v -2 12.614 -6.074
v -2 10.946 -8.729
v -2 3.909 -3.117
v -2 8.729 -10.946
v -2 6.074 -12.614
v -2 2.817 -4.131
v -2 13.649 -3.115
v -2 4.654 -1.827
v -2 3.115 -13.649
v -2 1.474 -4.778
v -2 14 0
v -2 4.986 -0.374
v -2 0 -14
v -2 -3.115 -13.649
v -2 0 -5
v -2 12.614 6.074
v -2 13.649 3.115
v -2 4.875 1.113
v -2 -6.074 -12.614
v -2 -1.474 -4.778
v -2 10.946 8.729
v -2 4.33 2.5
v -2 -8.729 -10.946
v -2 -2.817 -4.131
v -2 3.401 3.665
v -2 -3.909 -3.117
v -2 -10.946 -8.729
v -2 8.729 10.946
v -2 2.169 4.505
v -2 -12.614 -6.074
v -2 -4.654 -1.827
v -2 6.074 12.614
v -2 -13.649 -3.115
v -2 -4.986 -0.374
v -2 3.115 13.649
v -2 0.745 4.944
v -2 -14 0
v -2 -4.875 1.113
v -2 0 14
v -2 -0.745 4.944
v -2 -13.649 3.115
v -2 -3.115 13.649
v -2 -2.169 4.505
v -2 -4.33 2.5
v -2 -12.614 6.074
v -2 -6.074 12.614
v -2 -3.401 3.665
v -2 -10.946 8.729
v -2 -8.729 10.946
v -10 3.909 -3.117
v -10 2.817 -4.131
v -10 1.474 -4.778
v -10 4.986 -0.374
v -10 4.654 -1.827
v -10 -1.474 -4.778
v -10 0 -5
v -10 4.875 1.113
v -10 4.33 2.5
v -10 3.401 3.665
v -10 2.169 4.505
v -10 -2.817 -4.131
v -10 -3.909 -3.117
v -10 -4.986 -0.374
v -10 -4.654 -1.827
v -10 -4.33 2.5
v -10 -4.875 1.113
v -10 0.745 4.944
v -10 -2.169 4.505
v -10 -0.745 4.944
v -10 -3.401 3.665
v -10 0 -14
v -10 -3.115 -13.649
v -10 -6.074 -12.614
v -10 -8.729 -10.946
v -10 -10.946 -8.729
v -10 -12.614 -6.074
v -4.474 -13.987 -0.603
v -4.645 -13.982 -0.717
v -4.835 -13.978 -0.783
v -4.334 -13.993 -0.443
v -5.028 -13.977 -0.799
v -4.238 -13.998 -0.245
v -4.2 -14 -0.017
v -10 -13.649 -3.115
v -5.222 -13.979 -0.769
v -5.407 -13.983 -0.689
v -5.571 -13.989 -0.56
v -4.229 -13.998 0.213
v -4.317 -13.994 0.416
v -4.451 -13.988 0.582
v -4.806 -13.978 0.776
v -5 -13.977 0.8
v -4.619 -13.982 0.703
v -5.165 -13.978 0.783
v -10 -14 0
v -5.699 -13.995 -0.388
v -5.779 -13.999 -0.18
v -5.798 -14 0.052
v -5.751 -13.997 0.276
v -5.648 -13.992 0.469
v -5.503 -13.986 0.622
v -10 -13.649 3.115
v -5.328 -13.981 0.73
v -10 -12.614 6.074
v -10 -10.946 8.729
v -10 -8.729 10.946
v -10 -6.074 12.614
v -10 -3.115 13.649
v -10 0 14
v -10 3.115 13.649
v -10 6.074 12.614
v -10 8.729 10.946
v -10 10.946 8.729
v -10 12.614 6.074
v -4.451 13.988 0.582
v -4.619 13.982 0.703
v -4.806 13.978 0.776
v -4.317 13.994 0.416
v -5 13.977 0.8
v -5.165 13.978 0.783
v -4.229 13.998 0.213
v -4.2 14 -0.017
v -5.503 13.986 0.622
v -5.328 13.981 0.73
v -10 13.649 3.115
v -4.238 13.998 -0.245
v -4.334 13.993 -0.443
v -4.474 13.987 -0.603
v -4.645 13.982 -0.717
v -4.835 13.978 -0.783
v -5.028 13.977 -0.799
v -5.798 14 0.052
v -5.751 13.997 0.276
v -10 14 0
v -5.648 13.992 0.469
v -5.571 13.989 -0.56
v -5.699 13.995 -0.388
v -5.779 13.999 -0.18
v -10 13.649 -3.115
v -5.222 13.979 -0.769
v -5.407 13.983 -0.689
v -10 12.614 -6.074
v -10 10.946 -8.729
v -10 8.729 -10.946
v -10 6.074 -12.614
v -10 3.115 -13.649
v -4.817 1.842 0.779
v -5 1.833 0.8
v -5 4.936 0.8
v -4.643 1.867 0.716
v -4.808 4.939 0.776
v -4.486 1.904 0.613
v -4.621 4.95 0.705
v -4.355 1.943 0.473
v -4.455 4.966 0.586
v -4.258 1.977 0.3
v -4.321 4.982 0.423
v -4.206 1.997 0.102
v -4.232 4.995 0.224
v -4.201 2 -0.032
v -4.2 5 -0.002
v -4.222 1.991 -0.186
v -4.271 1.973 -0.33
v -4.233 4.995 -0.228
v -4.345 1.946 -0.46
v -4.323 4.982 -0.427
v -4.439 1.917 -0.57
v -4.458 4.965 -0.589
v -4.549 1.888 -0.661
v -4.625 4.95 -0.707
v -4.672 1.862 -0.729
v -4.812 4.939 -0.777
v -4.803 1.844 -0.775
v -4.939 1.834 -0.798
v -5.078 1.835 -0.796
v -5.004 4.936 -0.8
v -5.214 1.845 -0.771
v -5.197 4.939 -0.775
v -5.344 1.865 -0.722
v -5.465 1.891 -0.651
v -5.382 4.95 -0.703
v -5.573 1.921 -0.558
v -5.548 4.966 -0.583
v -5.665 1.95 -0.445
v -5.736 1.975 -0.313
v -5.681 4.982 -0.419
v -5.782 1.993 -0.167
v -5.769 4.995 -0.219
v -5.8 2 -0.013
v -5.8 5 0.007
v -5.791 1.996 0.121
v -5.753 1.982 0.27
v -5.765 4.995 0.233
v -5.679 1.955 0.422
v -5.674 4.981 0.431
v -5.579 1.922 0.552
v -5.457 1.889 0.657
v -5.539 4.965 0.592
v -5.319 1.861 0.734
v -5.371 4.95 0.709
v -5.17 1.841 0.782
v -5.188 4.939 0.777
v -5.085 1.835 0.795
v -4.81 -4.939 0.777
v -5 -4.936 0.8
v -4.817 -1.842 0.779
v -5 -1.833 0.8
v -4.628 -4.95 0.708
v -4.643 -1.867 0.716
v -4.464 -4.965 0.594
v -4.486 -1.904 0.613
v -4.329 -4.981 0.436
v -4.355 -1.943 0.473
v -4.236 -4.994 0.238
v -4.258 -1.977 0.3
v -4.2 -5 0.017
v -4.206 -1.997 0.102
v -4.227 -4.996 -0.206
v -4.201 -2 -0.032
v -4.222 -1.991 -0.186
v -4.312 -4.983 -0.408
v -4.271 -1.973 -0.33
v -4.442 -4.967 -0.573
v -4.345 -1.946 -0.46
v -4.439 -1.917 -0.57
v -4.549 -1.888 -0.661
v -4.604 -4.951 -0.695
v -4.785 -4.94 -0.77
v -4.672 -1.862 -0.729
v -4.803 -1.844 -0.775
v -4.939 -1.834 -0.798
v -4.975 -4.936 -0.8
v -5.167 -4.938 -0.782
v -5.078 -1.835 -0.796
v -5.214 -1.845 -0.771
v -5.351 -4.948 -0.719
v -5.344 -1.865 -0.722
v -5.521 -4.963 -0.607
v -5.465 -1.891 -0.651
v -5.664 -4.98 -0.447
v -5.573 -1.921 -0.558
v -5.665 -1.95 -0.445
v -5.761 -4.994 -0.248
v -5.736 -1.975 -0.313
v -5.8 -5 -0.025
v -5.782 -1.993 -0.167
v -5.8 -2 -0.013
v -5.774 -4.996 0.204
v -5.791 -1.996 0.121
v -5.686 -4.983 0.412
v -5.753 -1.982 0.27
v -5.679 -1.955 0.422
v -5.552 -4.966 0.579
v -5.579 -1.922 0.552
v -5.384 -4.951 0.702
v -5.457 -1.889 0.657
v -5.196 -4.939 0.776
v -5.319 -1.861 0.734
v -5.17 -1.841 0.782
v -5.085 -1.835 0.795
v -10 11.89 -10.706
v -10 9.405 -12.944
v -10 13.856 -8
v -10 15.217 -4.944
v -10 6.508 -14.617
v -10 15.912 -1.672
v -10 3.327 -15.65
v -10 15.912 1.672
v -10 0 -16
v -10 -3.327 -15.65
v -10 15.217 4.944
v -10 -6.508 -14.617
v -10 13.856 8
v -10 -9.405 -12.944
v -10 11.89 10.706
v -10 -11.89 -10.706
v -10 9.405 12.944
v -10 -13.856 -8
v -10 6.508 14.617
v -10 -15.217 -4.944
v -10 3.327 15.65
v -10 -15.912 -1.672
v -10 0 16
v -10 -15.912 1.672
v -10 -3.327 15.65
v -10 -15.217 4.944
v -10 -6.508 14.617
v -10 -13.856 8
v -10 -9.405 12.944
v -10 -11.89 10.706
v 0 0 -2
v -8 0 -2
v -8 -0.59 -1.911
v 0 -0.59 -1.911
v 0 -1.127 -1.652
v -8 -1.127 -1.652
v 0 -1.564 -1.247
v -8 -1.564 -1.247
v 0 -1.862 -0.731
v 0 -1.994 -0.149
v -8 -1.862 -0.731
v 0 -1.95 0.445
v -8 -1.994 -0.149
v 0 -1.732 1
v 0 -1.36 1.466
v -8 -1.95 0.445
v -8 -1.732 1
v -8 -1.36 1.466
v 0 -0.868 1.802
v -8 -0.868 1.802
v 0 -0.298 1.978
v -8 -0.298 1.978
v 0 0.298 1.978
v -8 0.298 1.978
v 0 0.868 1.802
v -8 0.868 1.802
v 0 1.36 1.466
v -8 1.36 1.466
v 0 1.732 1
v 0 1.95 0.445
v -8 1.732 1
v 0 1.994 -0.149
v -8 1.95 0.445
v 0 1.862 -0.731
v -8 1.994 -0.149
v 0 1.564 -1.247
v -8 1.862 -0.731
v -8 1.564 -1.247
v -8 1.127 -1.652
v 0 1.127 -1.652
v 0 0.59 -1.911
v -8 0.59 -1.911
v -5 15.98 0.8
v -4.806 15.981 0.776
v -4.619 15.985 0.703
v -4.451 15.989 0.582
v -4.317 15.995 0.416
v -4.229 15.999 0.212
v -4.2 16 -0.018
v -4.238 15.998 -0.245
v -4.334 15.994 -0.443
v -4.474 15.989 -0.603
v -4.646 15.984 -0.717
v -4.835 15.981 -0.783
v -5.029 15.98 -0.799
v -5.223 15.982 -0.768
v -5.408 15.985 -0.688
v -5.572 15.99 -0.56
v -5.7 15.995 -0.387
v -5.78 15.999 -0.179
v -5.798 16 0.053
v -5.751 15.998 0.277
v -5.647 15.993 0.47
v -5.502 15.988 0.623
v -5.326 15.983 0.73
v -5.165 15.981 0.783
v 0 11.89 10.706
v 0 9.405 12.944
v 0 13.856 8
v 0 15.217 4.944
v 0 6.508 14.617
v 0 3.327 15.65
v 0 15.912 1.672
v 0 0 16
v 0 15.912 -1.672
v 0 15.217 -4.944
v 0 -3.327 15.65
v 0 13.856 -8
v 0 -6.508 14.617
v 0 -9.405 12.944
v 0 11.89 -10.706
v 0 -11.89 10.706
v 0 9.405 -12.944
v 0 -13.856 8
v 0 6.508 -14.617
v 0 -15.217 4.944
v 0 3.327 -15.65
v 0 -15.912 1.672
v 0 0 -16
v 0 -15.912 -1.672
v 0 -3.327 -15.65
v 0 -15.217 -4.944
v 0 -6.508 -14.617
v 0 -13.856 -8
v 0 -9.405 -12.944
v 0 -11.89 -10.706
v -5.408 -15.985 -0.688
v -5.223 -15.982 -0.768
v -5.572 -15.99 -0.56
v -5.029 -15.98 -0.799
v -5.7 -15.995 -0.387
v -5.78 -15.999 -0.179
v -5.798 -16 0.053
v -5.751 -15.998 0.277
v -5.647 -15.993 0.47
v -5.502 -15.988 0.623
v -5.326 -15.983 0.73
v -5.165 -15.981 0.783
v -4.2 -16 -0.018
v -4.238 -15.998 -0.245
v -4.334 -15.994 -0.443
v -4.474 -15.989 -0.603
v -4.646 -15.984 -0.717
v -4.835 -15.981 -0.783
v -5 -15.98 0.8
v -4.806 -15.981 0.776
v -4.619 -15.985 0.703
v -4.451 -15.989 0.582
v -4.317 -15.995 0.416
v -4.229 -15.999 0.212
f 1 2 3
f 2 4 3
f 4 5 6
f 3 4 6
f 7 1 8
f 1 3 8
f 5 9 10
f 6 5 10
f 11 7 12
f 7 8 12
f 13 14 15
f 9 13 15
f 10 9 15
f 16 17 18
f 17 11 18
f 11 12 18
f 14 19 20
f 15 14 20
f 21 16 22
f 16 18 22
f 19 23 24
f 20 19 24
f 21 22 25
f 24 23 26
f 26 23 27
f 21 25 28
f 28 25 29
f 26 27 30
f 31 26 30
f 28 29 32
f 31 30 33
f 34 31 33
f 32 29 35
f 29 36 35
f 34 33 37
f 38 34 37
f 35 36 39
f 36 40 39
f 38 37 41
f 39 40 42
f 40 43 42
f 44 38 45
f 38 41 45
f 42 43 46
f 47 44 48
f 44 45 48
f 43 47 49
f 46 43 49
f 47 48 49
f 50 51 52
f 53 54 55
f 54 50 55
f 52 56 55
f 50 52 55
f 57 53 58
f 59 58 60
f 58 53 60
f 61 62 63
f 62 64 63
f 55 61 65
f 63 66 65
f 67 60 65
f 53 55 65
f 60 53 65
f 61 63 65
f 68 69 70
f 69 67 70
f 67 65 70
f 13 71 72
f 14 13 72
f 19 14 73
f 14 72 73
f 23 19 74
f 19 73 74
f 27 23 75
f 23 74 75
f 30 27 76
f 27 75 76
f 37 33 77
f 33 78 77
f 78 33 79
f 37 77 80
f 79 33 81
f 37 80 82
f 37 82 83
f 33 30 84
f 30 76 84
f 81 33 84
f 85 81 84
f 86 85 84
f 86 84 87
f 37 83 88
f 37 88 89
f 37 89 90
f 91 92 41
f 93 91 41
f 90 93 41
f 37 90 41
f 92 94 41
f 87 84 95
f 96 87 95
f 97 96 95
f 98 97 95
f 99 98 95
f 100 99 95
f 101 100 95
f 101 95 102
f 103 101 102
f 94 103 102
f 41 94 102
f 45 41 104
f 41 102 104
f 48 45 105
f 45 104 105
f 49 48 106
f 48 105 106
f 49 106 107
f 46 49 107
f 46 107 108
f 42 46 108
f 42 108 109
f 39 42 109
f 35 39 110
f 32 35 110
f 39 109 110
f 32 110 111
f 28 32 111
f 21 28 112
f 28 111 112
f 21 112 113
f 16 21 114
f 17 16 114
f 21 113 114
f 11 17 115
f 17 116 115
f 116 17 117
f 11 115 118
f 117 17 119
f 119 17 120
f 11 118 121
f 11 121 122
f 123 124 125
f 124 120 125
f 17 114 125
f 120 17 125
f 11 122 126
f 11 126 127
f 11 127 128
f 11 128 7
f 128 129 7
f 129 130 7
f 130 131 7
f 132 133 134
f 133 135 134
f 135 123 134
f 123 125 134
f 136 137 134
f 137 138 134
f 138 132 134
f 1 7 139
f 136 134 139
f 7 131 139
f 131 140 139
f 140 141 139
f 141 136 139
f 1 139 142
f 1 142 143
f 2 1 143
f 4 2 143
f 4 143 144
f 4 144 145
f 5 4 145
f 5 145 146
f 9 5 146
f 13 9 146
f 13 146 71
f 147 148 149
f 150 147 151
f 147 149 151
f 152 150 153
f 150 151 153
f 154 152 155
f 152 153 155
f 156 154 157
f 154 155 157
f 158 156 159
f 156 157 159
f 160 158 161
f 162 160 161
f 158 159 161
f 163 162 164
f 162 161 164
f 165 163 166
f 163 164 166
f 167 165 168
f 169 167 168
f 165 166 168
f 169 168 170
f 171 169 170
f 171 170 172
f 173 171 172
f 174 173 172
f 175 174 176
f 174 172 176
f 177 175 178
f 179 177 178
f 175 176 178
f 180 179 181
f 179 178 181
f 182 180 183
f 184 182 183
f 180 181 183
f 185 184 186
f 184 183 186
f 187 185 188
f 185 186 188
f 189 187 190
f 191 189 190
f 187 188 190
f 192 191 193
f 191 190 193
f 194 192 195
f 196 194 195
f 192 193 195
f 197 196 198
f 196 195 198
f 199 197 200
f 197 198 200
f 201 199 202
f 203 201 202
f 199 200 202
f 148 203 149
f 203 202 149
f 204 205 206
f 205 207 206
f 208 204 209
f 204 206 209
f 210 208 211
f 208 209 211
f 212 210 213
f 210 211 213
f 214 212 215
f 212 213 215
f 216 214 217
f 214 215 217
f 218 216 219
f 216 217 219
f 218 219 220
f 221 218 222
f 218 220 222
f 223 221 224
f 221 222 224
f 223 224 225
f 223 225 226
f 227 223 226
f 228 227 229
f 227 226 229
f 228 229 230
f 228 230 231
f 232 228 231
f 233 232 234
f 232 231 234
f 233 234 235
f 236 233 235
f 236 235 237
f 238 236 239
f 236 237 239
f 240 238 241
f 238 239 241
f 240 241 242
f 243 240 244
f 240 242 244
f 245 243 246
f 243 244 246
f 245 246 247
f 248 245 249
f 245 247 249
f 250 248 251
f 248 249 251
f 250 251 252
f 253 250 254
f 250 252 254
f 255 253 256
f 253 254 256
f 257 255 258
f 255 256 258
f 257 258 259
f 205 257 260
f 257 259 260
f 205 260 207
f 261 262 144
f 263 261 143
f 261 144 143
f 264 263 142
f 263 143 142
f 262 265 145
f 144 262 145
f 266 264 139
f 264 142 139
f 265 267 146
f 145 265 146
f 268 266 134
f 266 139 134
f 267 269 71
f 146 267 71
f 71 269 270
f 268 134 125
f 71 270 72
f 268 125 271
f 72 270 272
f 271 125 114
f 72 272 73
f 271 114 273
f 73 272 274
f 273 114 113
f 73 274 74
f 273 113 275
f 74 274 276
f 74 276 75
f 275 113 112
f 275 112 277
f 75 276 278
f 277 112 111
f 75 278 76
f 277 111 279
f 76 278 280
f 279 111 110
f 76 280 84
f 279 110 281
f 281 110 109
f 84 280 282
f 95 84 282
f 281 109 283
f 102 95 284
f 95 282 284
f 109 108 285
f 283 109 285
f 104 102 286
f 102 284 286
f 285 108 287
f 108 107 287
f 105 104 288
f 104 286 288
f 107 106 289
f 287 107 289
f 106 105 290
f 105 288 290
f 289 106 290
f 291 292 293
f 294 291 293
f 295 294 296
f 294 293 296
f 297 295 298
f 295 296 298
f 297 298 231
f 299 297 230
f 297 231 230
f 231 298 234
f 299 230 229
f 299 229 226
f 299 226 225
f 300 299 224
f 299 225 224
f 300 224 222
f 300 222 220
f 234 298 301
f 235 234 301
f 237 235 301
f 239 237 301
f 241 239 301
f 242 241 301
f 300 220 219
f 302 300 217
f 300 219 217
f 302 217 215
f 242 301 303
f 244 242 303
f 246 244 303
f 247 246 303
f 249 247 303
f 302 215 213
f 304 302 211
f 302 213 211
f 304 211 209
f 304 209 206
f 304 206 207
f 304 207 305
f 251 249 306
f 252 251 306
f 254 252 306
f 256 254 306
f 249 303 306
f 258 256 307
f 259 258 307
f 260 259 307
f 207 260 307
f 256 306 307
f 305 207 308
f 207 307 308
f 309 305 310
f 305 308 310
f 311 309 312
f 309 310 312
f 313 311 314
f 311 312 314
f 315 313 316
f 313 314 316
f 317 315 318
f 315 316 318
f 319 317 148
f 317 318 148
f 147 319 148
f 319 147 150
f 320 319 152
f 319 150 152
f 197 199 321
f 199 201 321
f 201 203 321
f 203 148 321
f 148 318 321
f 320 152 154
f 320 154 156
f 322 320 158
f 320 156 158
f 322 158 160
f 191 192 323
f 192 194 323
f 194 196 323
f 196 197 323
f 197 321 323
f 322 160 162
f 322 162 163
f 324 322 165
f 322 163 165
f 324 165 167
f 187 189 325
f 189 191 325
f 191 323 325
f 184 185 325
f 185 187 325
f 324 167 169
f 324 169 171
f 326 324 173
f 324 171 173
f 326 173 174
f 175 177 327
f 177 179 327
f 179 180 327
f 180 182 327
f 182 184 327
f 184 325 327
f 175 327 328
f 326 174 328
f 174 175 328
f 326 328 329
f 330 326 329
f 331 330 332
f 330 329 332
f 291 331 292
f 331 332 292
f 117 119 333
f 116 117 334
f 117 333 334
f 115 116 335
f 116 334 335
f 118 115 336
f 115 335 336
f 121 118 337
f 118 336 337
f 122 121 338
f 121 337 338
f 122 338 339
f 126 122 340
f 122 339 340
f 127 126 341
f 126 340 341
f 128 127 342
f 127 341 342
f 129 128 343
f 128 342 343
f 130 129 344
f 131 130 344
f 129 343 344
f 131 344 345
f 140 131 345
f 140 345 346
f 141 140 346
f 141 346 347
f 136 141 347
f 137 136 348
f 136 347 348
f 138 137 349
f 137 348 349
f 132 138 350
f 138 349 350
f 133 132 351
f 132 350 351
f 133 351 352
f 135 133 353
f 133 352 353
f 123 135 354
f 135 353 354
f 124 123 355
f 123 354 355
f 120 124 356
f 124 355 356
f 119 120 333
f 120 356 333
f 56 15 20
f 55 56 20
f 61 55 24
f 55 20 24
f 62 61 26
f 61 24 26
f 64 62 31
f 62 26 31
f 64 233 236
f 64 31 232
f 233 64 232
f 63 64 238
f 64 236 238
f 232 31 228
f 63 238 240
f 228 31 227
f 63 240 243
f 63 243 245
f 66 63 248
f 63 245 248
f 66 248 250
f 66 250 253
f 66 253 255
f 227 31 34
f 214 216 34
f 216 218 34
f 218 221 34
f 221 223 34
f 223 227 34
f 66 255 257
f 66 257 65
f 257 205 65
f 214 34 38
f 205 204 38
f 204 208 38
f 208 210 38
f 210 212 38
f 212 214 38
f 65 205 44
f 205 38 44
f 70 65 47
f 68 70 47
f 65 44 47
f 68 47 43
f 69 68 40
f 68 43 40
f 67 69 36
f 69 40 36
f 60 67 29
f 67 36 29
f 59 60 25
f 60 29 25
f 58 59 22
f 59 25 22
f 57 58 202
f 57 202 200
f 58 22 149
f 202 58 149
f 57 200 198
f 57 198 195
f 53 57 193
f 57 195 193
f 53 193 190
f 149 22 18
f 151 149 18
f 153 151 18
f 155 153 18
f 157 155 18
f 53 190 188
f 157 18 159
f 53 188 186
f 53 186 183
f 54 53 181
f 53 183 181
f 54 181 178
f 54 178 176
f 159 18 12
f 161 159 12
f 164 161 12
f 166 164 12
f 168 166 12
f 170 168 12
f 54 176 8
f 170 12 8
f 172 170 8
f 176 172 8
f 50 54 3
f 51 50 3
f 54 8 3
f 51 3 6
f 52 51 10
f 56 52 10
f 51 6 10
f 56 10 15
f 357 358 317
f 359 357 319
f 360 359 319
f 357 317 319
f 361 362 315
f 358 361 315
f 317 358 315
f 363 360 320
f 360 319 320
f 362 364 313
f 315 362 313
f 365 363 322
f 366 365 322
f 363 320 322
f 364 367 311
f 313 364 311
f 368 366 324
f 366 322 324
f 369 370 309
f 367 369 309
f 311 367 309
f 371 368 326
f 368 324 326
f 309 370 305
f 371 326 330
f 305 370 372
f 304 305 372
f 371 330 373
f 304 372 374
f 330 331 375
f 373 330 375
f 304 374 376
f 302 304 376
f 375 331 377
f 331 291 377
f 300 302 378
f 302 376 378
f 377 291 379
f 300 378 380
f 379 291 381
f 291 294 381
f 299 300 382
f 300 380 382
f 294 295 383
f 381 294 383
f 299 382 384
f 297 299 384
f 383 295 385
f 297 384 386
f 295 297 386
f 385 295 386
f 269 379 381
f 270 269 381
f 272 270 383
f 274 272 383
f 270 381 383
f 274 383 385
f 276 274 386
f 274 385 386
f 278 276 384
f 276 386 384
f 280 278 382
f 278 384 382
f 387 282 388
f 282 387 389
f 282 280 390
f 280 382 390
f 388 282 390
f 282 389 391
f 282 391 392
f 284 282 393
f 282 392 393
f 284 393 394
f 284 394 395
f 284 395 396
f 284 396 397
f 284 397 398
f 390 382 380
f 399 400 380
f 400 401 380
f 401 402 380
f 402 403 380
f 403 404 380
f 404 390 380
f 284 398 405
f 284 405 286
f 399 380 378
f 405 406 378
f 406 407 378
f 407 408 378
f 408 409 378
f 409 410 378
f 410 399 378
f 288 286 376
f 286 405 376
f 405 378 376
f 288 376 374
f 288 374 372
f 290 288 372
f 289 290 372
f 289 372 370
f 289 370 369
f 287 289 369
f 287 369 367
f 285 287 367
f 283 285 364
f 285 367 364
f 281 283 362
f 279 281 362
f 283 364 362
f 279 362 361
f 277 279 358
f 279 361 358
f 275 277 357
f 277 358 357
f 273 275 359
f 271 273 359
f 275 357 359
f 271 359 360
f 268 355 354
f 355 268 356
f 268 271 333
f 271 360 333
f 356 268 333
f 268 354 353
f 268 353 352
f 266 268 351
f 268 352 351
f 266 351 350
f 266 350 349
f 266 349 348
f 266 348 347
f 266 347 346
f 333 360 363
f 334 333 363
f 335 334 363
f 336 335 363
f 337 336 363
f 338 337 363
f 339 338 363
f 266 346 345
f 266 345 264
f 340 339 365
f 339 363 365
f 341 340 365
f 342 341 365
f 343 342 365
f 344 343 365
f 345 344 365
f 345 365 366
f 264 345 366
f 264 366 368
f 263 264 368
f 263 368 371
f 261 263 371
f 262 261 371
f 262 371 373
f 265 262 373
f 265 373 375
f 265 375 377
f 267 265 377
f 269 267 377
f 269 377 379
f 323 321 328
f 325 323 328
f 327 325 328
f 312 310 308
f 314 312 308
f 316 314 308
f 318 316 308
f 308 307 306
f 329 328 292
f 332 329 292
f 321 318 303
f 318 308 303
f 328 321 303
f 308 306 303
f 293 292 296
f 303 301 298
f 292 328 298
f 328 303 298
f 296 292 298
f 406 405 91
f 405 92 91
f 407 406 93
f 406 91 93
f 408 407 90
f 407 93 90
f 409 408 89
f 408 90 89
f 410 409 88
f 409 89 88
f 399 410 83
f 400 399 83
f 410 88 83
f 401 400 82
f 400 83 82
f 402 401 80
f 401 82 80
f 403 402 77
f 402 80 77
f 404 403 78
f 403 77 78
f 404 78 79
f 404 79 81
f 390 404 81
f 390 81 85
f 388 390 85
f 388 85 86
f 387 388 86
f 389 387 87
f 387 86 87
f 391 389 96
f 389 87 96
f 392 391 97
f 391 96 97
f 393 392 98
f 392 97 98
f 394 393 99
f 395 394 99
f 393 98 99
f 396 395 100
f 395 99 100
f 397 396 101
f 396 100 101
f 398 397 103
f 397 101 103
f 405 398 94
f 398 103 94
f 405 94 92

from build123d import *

# Parameters (mm, degrees)
ESBO_O6_R             = 0.8
CORTE_EXTRUS_O1_DEPTH = 35


with BuildPart() as part:
    # Esboço3 → Revolução1 (revolve)
    with BuildSketch(Plane.XY, mode=Mode.PRIVATE) as revolu_o1_sk:
        Polygon((0, 16), (0, 2), (-8, 2), (-8, 0), (-10, 0), (-10, 5), (-2, 5), (-2, 14), (-10, 14), (-10, 16), align=None)
    revolve(revolu_o1_sk.sketch.rotate(Axis((0, 0, 0), (-1, 0, 0)), 90), axis=Axis((0, 0, 0), (-1, 0, 0)))

    # Esboço6 → Corte-extrusão1 (cut, symmetric)
    with BuildSketch(Plane(origin=(0, 5, 0), x_dir=(1, 0, 0), z_dir=(0, 1, 0))):
        with Locations(Location((-5, 0, 0), (0, 0, 270))):
            Circle(ESBO_O6_R)
    extrude(amount=CORTE_EXTRUS_O1_DEPTH, both=True, mode=Mode.SUBTRACT)


solid = part.part
